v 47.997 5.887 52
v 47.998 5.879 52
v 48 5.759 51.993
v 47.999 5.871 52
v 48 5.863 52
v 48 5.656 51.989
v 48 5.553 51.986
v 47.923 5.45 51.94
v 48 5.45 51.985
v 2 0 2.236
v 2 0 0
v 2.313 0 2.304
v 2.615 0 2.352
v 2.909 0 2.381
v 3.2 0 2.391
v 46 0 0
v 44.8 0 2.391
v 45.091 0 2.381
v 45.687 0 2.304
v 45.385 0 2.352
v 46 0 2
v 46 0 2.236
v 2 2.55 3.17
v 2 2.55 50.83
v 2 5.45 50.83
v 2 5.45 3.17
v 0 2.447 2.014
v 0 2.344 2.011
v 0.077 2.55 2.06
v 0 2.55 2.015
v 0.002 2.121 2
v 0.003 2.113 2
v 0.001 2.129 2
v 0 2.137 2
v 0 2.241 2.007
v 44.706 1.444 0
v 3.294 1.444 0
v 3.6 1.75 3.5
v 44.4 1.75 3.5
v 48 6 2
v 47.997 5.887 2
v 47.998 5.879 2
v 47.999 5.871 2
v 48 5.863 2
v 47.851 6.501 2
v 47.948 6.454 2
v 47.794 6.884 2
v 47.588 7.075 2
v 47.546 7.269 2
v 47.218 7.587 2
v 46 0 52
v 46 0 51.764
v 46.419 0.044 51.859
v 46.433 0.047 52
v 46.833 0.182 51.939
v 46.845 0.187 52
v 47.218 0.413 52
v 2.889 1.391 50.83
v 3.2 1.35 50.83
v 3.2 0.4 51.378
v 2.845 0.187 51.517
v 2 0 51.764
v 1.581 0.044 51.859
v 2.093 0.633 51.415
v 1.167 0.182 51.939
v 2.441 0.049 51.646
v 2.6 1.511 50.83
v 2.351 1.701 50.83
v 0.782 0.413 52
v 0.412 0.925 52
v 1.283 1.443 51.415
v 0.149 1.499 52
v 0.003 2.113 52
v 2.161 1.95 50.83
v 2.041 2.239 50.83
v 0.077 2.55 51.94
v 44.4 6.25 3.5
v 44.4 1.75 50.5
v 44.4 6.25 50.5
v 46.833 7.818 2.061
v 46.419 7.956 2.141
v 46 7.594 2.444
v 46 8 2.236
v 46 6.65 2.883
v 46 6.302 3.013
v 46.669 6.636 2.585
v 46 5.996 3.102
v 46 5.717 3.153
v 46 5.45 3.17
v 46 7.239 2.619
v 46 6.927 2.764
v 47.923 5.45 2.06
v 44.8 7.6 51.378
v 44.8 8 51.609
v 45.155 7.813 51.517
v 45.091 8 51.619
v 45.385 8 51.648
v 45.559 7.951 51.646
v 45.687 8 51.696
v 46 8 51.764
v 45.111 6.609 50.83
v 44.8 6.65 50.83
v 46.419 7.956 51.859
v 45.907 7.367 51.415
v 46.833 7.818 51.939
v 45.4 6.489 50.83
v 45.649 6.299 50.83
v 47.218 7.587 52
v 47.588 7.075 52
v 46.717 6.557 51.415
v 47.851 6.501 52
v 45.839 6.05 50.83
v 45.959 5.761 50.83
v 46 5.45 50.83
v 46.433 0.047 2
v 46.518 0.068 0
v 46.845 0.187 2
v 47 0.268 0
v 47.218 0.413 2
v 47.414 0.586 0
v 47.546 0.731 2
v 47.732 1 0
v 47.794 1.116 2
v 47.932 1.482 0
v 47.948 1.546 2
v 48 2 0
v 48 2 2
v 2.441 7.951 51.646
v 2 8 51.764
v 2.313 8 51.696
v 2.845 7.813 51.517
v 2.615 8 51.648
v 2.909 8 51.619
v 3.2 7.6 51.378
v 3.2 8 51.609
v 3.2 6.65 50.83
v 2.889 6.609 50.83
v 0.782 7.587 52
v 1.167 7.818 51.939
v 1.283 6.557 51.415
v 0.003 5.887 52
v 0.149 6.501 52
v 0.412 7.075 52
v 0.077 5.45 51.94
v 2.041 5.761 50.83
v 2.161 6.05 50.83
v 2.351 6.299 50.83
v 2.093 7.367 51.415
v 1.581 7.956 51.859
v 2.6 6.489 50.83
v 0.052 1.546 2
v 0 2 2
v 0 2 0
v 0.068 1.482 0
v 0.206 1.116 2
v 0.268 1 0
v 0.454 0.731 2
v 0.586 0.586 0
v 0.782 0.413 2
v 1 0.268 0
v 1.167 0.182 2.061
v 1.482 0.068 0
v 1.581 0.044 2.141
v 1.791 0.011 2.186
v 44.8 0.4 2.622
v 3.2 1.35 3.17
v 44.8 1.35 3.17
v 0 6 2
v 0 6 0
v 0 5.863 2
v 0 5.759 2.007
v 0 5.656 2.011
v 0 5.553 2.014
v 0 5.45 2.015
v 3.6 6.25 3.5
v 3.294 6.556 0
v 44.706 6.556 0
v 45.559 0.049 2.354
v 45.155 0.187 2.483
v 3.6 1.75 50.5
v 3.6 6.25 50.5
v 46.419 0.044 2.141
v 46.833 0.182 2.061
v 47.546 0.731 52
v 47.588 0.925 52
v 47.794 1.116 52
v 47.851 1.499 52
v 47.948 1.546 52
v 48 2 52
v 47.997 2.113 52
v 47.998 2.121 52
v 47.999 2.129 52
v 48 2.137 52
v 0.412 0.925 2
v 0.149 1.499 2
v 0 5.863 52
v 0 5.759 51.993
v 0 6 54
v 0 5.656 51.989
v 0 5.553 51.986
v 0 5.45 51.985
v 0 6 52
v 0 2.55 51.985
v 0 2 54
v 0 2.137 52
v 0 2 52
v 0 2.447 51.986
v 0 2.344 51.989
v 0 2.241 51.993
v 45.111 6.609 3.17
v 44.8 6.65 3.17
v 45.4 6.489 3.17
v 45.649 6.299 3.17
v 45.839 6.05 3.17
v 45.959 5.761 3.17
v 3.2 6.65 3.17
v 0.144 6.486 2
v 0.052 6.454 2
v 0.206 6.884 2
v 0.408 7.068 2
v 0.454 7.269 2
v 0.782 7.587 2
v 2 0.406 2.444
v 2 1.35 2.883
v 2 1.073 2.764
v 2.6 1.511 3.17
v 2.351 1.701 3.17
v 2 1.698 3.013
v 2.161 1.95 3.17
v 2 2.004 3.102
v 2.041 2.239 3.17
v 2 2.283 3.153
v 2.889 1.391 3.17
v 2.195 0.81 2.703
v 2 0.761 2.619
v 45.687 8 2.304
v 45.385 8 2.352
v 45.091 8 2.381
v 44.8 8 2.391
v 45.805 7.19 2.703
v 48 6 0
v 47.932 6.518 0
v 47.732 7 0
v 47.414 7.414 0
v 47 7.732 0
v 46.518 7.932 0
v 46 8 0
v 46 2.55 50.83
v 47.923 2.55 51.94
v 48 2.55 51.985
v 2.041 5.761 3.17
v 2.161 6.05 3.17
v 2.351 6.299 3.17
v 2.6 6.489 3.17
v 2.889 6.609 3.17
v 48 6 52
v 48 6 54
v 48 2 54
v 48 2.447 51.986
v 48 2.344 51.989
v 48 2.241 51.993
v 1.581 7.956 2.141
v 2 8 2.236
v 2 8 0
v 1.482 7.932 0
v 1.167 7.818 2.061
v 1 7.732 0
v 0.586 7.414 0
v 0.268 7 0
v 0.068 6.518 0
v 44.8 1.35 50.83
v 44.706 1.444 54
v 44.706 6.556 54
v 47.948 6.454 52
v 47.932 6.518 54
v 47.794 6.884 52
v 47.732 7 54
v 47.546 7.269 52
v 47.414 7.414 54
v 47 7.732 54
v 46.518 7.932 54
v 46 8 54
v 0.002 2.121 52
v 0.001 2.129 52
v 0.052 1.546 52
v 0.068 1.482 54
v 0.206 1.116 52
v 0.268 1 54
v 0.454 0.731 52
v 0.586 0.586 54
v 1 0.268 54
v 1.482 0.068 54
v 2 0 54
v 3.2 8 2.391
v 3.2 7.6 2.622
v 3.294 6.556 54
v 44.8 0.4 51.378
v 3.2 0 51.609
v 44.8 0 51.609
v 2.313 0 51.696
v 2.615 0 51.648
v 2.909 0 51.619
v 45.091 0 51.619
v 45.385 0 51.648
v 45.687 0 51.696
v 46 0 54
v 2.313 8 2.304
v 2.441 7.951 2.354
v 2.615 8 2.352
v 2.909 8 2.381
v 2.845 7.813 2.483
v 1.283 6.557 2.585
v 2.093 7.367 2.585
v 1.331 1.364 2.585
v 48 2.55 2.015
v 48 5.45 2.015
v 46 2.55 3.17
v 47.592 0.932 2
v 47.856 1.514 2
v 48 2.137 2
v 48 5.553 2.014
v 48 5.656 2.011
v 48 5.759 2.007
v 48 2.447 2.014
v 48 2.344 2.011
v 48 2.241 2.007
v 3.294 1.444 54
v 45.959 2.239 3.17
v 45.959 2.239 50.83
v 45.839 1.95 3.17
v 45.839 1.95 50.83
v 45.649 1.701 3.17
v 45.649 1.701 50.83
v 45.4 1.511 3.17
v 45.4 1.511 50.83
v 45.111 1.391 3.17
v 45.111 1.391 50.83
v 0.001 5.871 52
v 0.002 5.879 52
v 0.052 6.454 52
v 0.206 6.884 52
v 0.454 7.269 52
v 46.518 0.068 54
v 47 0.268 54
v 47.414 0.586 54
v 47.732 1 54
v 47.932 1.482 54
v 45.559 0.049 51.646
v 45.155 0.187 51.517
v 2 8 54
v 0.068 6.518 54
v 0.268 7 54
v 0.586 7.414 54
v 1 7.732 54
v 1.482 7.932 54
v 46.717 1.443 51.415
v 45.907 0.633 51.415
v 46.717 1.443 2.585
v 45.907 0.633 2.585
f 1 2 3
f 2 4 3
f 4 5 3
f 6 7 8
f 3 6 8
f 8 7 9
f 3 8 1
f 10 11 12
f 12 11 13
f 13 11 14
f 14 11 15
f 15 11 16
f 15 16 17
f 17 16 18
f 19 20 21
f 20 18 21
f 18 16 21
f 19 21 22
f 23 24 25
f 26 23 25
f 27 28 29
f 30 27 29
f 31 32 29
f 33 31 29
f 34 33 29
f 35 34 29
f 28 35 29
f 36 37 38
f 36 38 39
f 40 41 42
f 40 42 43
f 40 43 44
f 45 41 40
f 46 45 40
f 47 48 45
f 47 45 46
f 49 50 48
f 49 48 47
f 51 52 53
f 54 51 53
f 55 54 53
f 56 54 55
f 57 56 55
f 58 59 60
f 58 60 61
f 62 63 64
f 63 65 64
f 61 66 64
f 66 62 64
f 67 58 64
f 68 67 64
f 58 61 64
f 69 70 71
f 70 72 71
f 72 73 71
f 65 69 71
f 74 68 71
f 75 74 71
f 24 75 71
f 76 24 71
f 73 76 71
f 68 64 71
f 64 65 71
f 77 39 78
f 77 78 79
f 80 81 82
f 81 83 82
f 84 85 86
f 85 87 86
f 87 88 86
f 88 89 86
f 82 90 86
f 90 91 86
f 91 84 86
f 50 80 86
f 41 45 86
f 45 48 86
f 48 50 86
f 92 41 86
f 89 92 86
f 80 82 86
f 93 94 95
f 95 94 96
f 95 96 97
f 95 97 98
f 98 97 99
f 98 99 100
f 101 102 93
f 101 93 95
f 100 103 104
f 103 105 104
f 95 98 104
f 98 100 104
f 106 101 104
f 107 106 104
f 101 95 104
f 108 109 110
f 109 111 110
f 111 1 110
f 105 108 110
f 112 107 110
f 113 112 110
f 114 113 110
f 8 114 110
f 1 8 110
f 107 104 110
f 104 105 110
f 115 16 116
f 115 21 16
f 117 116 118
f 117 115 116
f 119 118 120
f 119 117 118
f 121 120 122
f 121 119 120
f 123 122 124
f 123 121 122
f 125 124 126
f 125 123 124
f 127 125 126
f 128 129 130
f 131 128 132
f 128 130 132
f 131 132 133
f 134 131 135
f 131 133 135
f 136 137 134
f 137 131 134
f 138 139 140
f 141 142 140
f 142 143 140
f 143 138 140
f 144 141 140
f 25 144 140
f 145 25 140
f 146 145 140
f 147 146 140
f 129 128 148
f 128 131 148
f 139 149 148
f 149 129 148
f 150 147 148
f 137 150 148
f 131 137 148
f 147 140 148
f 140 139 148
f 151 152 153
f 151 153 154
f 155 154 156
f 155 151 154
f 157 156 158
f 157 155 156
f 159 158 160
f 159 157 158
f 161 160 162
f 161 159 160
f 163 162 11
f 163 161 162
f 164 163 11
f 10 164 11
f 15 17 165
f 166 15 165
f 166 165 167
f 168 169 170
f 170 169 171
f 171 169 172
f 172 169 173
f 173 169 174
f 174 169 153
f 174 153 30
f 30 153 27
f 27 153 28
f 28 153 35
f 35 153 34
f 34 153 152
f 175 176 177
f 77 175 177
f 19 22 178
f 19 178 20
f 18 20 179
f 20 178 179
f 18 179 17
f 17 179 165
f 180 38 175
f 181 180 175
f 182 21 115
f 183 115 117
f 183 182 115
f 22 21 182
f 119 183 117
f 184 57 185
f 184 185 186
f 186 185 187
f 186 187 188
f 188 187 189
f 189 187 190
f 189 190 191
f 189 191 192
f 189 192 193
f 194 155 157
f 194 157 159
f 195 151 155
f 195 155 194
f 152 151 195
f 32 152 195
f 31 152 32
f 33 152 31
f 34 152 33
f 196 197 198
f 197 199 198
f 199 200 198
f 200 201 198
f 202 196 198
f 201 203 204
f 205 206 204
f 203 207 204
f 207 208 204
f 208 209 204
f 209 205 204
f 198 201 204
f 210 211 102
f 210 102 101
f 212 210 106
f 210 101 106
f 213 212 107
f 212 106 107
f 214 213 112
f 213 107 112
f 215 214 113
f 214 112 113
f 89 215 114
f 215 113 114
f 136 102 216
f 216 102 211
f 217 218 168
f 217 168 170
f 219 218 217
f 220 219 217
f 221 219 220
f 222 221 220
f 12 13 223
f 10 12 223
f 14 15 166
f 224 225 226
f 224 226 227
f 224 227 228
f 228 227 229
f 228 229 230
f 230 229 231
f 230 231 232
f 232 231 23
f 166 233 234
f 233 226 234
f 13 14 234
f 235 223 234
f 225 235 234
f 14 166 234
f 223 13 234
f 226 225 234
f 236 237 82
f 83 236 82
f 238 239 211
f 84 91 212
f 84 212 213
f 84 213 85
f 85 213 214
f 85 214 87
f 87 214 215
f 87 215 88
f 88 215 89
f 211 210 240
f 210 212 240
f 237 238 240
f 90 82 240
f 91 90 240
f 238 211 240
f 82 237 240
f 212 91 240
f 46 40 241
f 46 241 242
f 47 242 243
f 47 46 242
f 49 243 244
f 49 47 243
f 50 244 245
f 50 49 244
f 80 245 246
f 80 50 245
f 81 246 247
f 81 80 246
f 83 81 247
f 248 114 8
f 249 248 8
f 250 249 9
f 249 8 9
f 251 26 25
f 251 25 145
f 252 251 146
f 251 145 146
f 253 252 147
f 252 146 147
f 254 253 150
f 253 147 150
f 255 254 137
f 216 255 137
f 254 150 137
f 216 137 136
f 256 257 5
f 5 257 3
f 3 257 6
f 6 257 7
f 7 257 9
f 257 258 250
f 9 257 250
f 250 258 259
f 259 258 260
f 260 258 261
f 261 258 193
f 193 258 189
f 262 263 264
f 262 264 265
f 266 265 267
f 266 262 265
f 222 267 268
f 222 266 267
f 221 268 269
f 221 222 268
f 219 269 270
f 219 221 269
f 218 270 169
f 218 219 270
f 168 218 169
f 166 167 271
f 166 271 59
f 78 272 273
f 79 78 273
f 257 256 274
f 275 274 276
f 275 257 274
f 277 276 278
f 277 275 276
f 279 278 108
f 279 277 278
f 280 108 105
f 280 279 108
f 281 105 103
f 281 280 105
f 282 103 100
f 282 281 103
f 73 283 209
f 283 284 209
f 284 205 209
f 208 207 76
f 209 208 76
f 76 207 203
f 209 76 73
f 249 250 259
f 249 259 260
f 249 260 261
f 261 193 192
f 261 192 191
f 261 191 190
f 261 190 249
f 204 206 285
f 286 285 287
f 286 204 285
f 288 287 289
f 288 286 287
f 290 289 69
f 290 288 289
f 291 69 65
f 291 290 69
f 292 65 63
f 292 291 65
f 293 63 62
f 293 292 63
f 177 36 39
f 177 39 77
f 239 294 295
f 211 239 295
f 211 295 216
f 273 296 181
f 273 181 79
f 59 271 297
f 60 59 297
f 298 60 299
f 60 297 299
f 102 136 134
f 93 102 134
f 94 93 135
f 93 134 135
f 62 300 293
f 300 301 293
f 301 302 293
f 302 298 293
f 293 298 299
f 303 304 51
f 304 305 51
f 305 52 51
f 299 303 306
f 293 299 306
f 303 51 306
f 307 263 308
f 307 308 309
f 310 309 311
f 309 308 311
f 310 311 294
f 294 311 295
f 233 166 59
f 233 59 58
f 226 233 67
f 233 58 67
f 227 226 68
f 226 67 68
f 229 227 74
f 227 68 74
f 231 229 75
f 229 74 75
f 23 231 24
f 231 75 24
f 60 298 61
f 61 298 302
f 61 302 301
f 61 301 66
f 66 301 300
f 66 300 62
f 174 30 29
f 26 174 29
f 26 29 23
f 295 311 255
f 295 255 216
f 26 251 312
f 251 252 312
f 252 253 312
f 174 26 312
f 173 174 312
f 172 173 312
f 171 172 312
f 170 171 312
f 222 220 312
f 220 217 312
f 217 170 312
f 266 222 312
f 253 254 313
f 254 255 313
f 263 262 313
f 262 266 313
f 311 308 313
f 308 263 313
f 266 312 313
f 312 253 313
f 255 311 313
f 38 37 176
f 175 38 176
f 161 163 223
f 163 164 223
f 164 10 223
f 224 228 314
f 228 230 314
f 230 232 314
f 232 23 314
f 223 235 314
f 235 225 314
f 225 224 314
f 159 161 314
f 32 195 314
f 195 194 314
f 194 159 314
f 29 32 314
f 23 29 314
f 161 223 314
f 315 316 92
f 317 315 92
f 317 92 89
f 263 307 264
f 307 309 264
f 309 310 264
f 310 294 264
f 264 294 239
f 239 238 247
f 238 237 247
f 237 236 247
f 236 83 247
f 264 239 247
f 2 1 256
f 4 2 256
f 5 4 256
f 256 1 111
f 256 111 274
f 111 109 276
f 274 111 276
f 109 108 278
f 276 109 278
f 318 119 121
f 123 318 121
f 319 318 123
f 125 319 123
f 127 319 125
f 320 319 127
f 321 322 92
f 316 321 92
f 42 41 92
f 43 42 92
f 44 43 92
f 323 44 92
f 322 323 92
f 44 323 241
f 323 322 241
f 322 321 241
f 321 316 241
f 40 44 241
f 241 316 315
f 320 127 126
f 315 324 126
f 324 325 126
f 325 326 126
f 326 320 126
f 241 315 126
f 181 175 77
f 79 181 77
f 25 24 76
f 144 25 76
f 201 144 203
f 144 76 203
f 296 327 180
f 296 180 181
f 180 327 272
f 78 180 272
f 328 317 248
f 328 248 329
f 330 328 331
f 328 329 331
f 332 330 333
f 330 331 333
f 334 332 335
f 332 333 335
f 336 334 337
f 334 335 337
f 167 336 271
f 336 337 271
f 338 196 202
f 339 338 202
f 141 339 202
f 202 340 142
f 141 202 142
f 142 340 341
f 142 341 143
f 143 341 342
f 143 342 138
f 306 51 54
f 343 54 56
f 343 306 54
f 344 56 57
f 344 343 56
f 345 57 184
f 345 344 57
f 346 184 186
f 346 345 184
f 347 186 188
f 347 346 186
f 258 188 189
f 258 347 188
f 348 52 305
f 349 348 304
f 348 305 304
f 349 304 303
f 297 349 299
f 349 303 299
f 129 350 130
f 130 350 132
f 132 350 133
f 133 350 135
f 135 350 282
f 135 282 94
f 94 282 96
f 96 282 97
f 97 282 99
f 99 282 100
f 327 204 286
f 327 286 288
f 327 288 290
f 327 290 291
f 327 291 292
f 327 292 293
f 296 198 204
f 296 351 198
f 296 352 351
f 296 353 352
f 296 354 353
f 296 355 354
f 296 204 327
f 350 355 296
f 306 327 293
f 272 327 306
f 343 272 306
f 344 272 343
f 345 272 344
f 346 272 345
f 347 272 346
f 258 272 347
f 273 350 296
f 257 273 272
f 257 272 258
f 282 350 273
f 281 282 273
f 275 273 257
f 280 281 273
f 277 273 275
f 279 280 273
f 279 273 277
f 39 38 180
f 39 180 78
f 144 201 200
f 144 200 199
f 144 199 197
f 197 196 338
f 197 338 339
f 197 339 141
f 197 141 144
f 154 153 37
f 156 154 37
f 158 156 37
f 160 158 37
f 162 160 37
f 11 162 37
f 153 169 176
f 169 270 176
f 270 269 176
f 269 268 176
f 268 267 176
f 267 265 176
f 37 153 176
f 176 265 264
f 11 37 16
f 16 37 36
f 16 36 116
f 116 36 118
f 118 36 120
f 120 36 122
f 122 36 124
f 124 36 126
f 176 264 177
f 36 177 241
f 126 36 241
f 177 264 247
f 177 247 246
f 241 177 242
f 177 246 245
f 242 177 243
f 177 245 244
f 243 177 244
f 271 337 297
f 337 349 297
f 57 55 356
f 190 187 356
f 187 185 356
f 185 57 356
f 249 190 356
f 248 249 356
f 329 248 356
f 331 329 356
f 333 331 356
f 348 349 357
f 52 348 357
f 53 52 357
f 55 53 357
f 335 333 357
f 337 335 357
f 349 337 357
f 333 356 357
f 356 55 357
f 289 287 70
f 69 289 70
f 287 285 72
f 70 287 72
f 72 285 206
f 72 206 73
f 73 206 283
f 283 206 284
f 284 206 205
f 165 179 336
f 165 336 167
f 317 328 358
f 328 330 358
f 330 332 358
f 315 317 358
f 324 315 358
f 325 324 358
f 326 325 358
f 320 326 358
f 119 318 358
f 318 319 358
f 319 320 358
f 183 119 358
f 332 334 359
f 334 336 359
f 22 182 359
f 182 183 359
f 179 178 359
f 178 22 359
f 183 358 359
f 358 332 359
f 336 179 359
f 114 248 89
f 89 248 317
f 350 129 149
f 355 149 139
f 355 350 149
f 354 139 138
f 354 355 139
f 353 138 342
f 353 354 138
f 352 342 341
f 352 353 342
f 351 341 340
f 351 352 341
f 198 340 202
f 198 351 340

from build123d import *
from OCP.BRepFilletAPI import BRepFilletAPI_MakeChamfer

# Parameters (mm, degrees)
SKETCH1_W           = 48
SKETCH1_H           = 8
SKETCH1_W_2         = 40.8
SKETCH1_H_2         = 4.5
BOSS_EXTRUDE1_DEPTH = 54
CUT_EXTRUDE1_START  = -2
SKETCH2_OUTSIDE_W   = 64.538
SKETCH2_OUTSIDE_H   = 24.538
CUT_EXTRUDE1_DEPTH  = 50
FILLET1_R           = 2
CHAMFER4_SIZE       = 1.17
CHAMFER4_SIZE_2     = 2.026499445
CHAMFER5_SIZE       = 3.5
CHAMFER5_SIZE2      = 0.306210322


with BuildPart() as part:
    # Sketch1 → Boss-Extrude1 (new body)
    with BuildSketch(Plane.XY):
        with Locations((24, 4)):
            Rectangle(SKETCH1_W, SKETCH1_H)
        with Locations((24, 4)):
            Rectangle(SKETCH1_W_2, SKETCH1_H_2, mode=Mode.SUBTRACT)
    extrude(amount=BOSS_EXTRUDE1_DEPTH)

    # Sketch2 outside → Cut-Extrude1 (cut)
    with BuildSketch(Plane.XY.offset(54).offset(CUT_EXTRUDE1_START)):
        with Locations((24, 4)):
            Rectangle(SKETCH2_OUTSIDE_W, SKETCH2_OUTSIDE_H)
        with BuildLine():
            Line((3.2, 6.65), (44.8, 6.65))
            ThreePointArc((44.8, 6.65), (45.648528137, 6.298528137), (46, 5.45))
            Line((46, 5.45), (46, 2.55))
            ThreePointArc((46, 2.55), (45.648528137, 1.701471863), (44.8, 1.35))
            Line((44.8, 1.35), (3.2, 1.35))
            ThreePointArc((3.2, 1.35), (2.351471863, 1.701471863), (2, 2.55))
            Line((2, 2.55), (2, 5.45))
            ThreePointArc((2, 5.45), (2.351471863, 6.298528137), (3.2, 6.65))
        make_face(mode=Mode.SUBTRACT)
    extrude(amount=-CUT_EXTRUDE1_DEPTH, mode=Mode.SUBTRACT)

    # Fillet1
    fillet1_edges = [part.edges().sort_by_distance(p)[0] for p in [
        (48, 0, 1),
        (0, 0, 1),
        (0, 8, 1),
        (48, 8, 1),
        (48, 0, 53),
        (0, 0, 53),
        (0, 8, 53),
        (48, 8, 53),
    ]]
    fillet(fillet1_edges, radius=FILLET1_R)

    # Chamfer4
    # the kernel refuses this chamfer: 2.026499445, 1.17 mm, written as the material it adds along each edge
    with BuildSketch(Plane(origin=(2, 2.55, 52), x_dir=(0.05789386240267108, 0, -0.9983227437537927), z_dir=(0, 1, 0))) as chamfer4_piece_1_section:
        Polygon((CHAMFER4_SIZE * 0.998322743754, CHAMFER4_SIZE * 0.0578938624027), (-CHAMFER4_SIZE_2 * 0.0578938623985, CHAMFER4_SIZE_2 * 0.998322743683), (0, 0), align=None)
    chamfer4_piece_1 = extrude(amount=2.9, mode=Mode.PRIVATE)
    chamfer4_piece_1 = split(chamfer4_piece_1, bisect_by=Plane(origin=(0, 4, 51.609934173), z_dir=(1, 0, 0)), keep=Keep.TOP, mode=Mode.PRIVATE)
    add(chamfer4_piece_1)
    with BuildSketch(Plane(origin=(2, 2.55, 2), x_dir=(-0.999813220622208, 0, -0.019326765612700622), z_dir=(0, 1, 0))) as chamfer4_piece_2_section:
        Polygon((CHAMFER4_SIZE_2 * 0.999813220551, CHAMFER4_SIZE_2 * 0.0193267656113), (-CHAMFER4_SIZE * 0.0193267656127, CHAMFER4_SIZE * 0.999813220622), (0, 0), align=None)
    chamfer4_piece_2 = extrude(amount=2.9, mode=Mode.PRIVATE)
    chamfer4_piece_2 = split(chamfer4_piece_2, bisect_by=Plane(origin=(0, 4, 2.390065827), z_dir=(1, 0, 0)), keep=Keep.TOP, mode=Mode.PRIVATE)
    add(chamfer4_piece_2)
    with BuildSketch(Plane(origin=(3.2, 2.55, 52), x_dir=(0, -1, 0), z_dir=(1, 0, 0))) as chamfer4_piece_3_section:
        Polygon((1.2, CHAMFER4_SIZE), (1.2 + CHAMFER4_SIZE_2, 0), (1.2, 0), align=None)
    chamfer4_piece_3 = revolve(axis=Axis((3.2, 2.55, 52), (0, 0, -1)), revolution_arc=90, mode=Mode.PRIVATE)
    chamfer4_piece_3 = chamfer4_piece_3 & Plane(origin=(2, 2, 51.456530792), x_dir=(0, -1, 0), z_dir=(0, 0, 1)) * Cylinder(2, 13, mode=Mode.PRIVATE)
    add(chamfer4_piece_3)
    with BuildSketch(Plane(origin=(3.2, 2.55, 52), x_dir=(0, -1, 0), z_dir=(1, 0, 0))) as chamfer4_piece_4_section:
        Polygon((1.2, CHAMFER4_SIZE), (1.2 + CHAMFER4_SIZE_2, 0), (1.2, 0), align=None)
    chamfer4_piece_4 = revolve(axis=Axis((3.2, 2.55, 52), (0, 0, -1)), revolution_arc=90, mode=Mode.PRIVATE)
    chamfer4_piece_4 = split(chamfer4_piece_4, bisect_by=Plane(origin=(2, 0.130683468, 51.773765117), z_dir=(1, 0, 0)), keep=Keep.TOP, mode=Mode.PRIVATE)
    chamfer4_piece_4 = split(chamfer4_piece_4, bisect_by=Plane(origin=(2.932508476, 0, 51.773765117), z_dir=(0, 1, 0)), keep=Keep.TOP, mode=Mode.PRIVATE)
    add(chamfer4_piece_4)
    with BuildSketch(Plane(origin=(3.2, 2.55, 52), x_dir=(0, -1, 0), z_dir=(1, 0, 0))) as chamfer4_piece_5_section:
        Polygon((1.2, CHAMFER4_SIZE), (1.2 + CHAMFER4_SIZE_2, 0), (1.2, 0), align=None)
    chamfer4_piece_5 = revolve(axis=Axis((3.2, 2.55, 52), (0, 0, -1)), revolution_arc=90, mode=Mode.PRIVATE)
    chamfer4_piece_5 = split(chamfer4_piece_5, bisect_by=Plane(origin=(0.031272967, 1.35, 51.984062188), z_dir=(0, 1, 0)), keep=Keep.TOP, mode=Mode.PRIVATE)
    chamfer4_piece_5 = split(chamfer4_piece_5, bisect_by=Plane(origin=(0, 2.450571478, 51.984062188), z_dir=(1, 0, 0)), keep=Keep.TOP, mode=Mode.PRIVATE)
    add(chamfer4_piece_5)
    with BuildSketch(Plane(origin=(3.2, 2.55, 2), x_dir=(0, -1, 0), z_dir=(1, 0, 0))) as chamfer4_piece_6_section:
        Polygon((1.2 + CHAMFER4_SIZE_2, 0), (1.2, -CHAMFER4_SIZE), (1.2, 0), align=None)
    chamfer4_piece_6 = revolve(axis=Axis((3.2, 2.55, 2), (0, 0, -1)), revolution_arc=90, mode=Mode.PRIVATE)
    chamfer4_piece_6 = split(chamfer4_piece_6, bisect_by=Plane(origin=(2.932508484, 0, 2.226234886), z_dir=(0, 1, 0)), keep=Keep.TOP, mode=Mode.PRIVATE)
    chamfer4_piece_6 = split(chamfer4_piece_6, bisect_by=Plane(origin=(2, 0.130683471, 2.226234886), z_dir=(1, 0, 0)), keep=Keep.TOP, mode=Mode.PRIVATE)
    add(chamfer4_piece_6)
    with BuildSketch(Plane(origin=(3.2, 2.55, 2), x_dir=(0, -1, 0), z_dir=(1, 0, 0))) as chamfer4_piece_7_section:
        Polygon((1.2 + CHAMFER4_SIZE_2, 0), (1.2, -CHAMFER4_SIZE), (1.2, 0), align=None)
    chamfer4_piece_7 = revolve(axis=Axis((3.2, 2.55, 2), (0, 0, -1)), revolution_arc=90, mode=Mode.PRIVATE)
    chamfer4_piece_7 = chamfer4_piece_7 & Plane(origin=(2, 2, 2.22929574), x_dir=(-1, 0, 0), z_dir=(0, 0, 1)) * Cylinder(2, 13, mode=Mode.PRIVATE)
    add(chamfer4_piece_7)
    with BuildSketch(Plane(origin=(3.2, 2.55, 2), x_dir=(0, -1, 0), z_dir=(1, 0, 0))) as chamfer4_piece_8_section:
        Polygon((1.2 + CHAMFER4_SIZE_2, 0), (1.2, -CHAMFER4_SIZE), (1.2, 0), align=None)
    chamfer4_piece_8 = revolve(axis=Axis((3.2, 2.55, 2), (0, 0, -1)), revolution_arc=90, mode=Mode.PRIVATE)
    chamfer4_piece_8 = split(chamfer4_piece_8, bisect_by=Plane(origin=(0, 2.450571478, 2.015937812), z_dir=(1, 0, 0)), keep=Keep.TOP, mode=Mode.PRIVATE)
    chamfer4_piece_8 = split(chamfer4_piece_8, bisect_by=Plane(origin=(0.031272967, 1.35, 2.015937812), z_dir=(0, 1, 0)), keep=Keep.TOP, mode=Mode.PRIVATE)
    add(chamfer4_piece_8)
    with BuildSketch(Plane(origin=(3.2, 5.45, 52), x_dir=(-1, 0, 0), z_dir=(0, -1, 0))) as chamfer4_piece_9_section:
        Polygon((1.2, CHAMFER4_SIZE), (1.2 + CHAMFER4_SIZE_2, 0), (1.2, 0), align=None)
    chamfer4_piece_9 = revolve(axis=Axis((3.2, 5.45, 52), (0, 0, -1)), revolution_arc=90, mode=Mode.PRIVATE)
    chamfer4_piece_9 = chamfer4_piece_9 & Plane(origin=(2, 6, 51.456530792), x_dir=(0, 1, 0), z_dir=(0, 0, 1)) * Cylinder(2, 13, mode=Mode.PRIVATE)
    add(chamfer4_piece_9)
    with BuildSketch(Plane(origin=(3.2, 5.45, 52), x_dir=(-1, 0, 0), z_dir=(0, -1, 0))) as chamfer4_piece_10_section:
        Polygon((1.2, CHAMFER4_SIZE), (1.2 + CHAMFER4_SIZE_2, 0), (1.2, 0), align=None)
    chamfer4_piece_10 = revolve(axis=Axis((3.2, 5.45, 52), (0, 0, -1)), revolution_arc=90, mode=Mode.PRIVATE)
    chamfer4_piece_10 = split(chamfer4_piece_10, bisect_by=Plane(origin=(0.031272967, 6.65, 51.984062188), z_dir=(0, -1, 0)), keep=Keep.TOP, mode=Mode.PRIVATE)
    chamfer4_piece_10 = split(chamfer4_piece_10, bisect_by=Plane(origin=(0, 5.549428522, 51.984062188), z_dir=(1, 0, 0)), keep=Keep.TOP, mode=Mode.PRIVATE)
    add(chamfer4_piece_10)
    with BuildSketch(Plane(origin=(3.2, 5.45, 52), x_dir=(-1, 0, 0), z_dir=(0, -1, 0))) as chamfer4_piece_11_section:
        Polygon((1.2, CHAMFER4_SIZE), (1.2 + CHAMFER4_SIZE_2, 0), (1.2, 0), align=None)
    chamfer4_piece_11 = revolve(axis=Axis((3.2, 5.45, 52), (0, 0, -1)), revolution_arc=90, mode=Mode.PRIVATE)
    chamfer4_piece_11 = split(chamfer4_piece_11, bisect_by=Plane(origin=(2, 7.869316535, 51.773765118), z_dir=(1, 0, 0)), keep=Keep.TOP, mode=Mode.PRIVATE)
    chamfer4_piece_11 = split(chamfer4_piece_11, bisect_by=Plane(origin=(2.932508473, 8, 51.773765118), z_dir=(0, -1, 0)), keep=Keep.TOP, mode=Mode.PRIVATE)
    add(chamfer4_piece_11)
    with BuildSketch(Plane(origin=(3.2, 5.45, 2), x_dir=(-1, 0, 0), z_dir=(0, -1, 0))) as chamfer4_piece_12_section:
        Polygon((1.2 + CHAMFER4_SIZE_2, 0), (1.2, -CHAMFER4_SIZE), (1.2, 0), align=None)
    chamfer4_piece_12 = revolve(axis=Axis((3.2, 5.45, 2), (0, 0, -1)), revolution_arc=90, mode=Mode.PRIVATE)
    chamfer4_piece_12 = split(chamfer4_piece_12, bisect_by=Plane(origin=(0, 5.549428522, 2.015937812), z_dir=(1, 0, 0)), keep=Keep.TOP, mode=Mode.PRIVATE)
    chamfer4_piece_12 = split(chamfer4_piece_12, bisect_by=Plane(origin=(0.031272967, 6.65, 2.015937812), z_dir=(0, -1, 0)), keep=Keep.TOP, mode=Mode.PRIVATE)
    add(chamfer4_piece_12)
    with BuildSketch(Plane(origin=(3.2, 5.45, 2), x_dir=(-1, 0, 0), z_dir=(0, -1, 0))) as chamfer4_piece_13_section:
        Polygon((1.2 + CHAMFER4_SIZE_2, 0), (1.2, -CHAMFER4_SIZE), (1.2, 0), align=None)
    chamfer4_piece_13 = revolve(axis=Axis((3.2, 5.45, 2), (0, 0, -1)), revolution_arc=90, mode=Mode.PRIVATE)
    chamfer4_piece_13 = chamfer4_piece_13 & Plane(origin=(2, 6, 2.22929574), x_dir=(0, 1, 0), z_dir=(0, 0, 1)) * Cylinder(2, 13, mode=Mode.PRIVATE)
    add(chamfer4_piece_13)
    with BuildSketch(Plane(origin=(3.2, 5.45, 2), x_dir=(-1, 0, 0), z_dir=(0, -1, 0))) as chamfer4_piece_14_section:
        Polygon((1.2 + CHAMFER4_SIZE_2, 0), (1.2, -CHAMFER4_SIZE), (1.2, 0), align=None)
    chamfer4_piece_14 = revolve(axis=Axis((3.2, 5.45, 2), (0, 0, -1)), revolution_arc=90, mode=Mode.PRIVATE)
    chamfer4_piece_14 = split(chamfer4_piece_14, bisect_by=Plane(origin=(2.932508473, 8, 2.226234882), z_dir=(0, -1, 0)), keep=Keep.TOP, mode=Mode.PRIVATE)
    chamfer4_piece_14 = split(chamfer4_piece_14, bisect_by=Plane(origin=(2, 7.869316535, 2.226234882), z_dir=(1, 0, 0)), keep=Keep.TOP, mode=Mode.PRIVATE)
    add(chamfer4_piece_14)
    with BuildSketch(Plane(origin=(44.8, 1.35, 52), x_dir=(0, 0.05789386240267127, -0.9983227437537927), z_dir=(-1, 0, 0))) as chamfer4_piece_15_section:
        Polygon((CHAMFER4_SIZE * 0.998322743754, CHAMFER4_SIZE * 0.0578938624027), (-CHAMFER4_SIZE_2 * 0.0578938623985, CHAMFER4_SIZE_2 * 0.998322743683), (0, 0), align=None)
    chamfer4_piece_15 = extrude(amount=41.6, mode=Mode.PRIVATE)
    chamfer4_piece_15 = split(chamfer4_piece_15, bisect_by=Plane(origin=(24, 0, 51.577415794), z_dir=(0, 1, 0)), keep=Keep.TOP, mode=Mode.PRIVATE)
    add(chamfer4_piece_15)
    with BuildSketch(Plane(origin=(44.8, 1.35, 2), x_dir=(0, -0.999813220622208, -0.019326765612700633), z_dir=(-1, 0, 0))) as chamfer4_piece_16_section:
        Polygon((CHAMFER4_SIZE_2 * 0.999813220551, CHAMFER4_SIZE_2 * 0.0193267656113), (-CHAMFER4_SIZE * 0.0193267656127, CHAMFER4_SIZE * 0.999813220622), (0, 0), align=None)
    chamfer4_piece_16 = extrude(amount=41.6, mode=Mode.PRIVATE)
    chamfer4_piece_16 = split(chamfer4_piece_16, bisect_by=Plane(origin=(24, 0, 2.422584206), z_dir=(0, 1, 0)), keep=Keep.TOP, mode=Mode.PRIVATE)
    add(chamfer4_piece_16)
    with BuildSketch(Plane(origin=(3.2, 6.65, 52), x_dir=(0, -0.05789386240267145, -0.9983227437537927), z_dir=(1, 0, 0))) as chamfer4_piece_17_section:
        Polygon((CHAMFER4_SIZE * 0.998322743754, CHAMFER4_SIZE * 0.0578938624027), (-CHAMFER4_SIZE_2 * 0.0578938623985, CHAMFER4_SIZE_2 * 0.998322743683), (0, 0), align=None)
    chamfer4_piece_17 = extrude(amount=41.6, mode=Mode.PRIVATE)
    chamfer4_piece_17 = split(chamfer4_piece_17, bisect_by=Plane(origin=(24, 8, 51.577415794), z_dir=(0, -1, 0)), keep=Keep.TOP, mode=Mode.PRIVATE)
    add(chamfer4_piece_17)
    with BuildSketch(Plane(origin=(3.2, 6.65, 2), x_dir=(0, 0.999813220622208, -0.019326765612700633), z_dir=(1, 0, 0))) as chamfer4_piece_18_section:
        Polygon((CHAMFER4_SIZE_2 * 0.999813220551, CHAMFER4_SIZE_2 * 0.0193267656113), (-CHAMFER4_SIZE * 0.0193267656127, CHAMFER4_SIZE * 0.999813220622), (0, 0), align=None)
    chamfer4_piece_18 = extrude(amount=41.6, mode=Mode.PRIVATE)
    chamfer4_piece_18 = split(chamfer4_piece_18, bisect_by=Plane(origin=(24, 8, 2.422584206), z_dir=(0, -1, 0)), keep=Keep.TOP, mode=Mode.PRIVATE)
    add(chamfer4_piece_18)
    with BuildSketch(Plane(origin=(44.8, 2.55, 52), x_dir=(1, 0, 0), z_dir=(0, 1, 0))) as chamfer4_piece_19_section:
        Polygon((1.2, CHAMFER4_SIZE), (1.2 + CHAMFER4_SIZE_2, 0), (1.2, 0), align=None)
    chamfer4_piece_19 = revolve(axis=Axis((44.8, 2.55, 52), (0, 0, -1)), revolution_arc=90, mode=Mode.PRIVATE)
    chamfer4_piece_19 = chamfer4_piece_19 & Plane(origin=(46, 2, 51.456530792), x_dir=(1, 0, 0), z_dir=(0, 0, 1)) * Cylinder(2, 13, mode=Mode.PRIVATE)
    add(chamfer4_piece_19)
    with BuildSketch(Plane(origin=(44.8, 2.55, 52), x_dir=(1, 0, 0), z_dir=(0, 1, 0))) as chamfer4_piece_20_section:
        Polygon((1.2, CHAMFER4_SIZE), (1.2 + CHAMFER4_SIZE_2, 0), (1.2, 0), align=None)
    chamfer4_piece_20 = revolve(axis=Axis((44.8, 2.55, 52), (0, 0, -1)), revolution_arc=90, mode=Mode.PRIVATE)
    chamfer4_piece_20 = split(chamfer4_piece_20, bisect_by=Plane(origin=(47.968727033, 1.35, 51.984062188), z_dir=(0, 1, 0)), keep=Keep.TOP, mode=Mode.PRIVATE)
    chamfer4_piece_20 = split(chamfer4_piece_20, bisect_by=Plane(origin=(48, 2.450571478, 51.984062188), z_dir=(-1, 0, 0)), keep=Keep.TOP, mode=Mode.PRIVATE)
    add(chamfer4_piece_20)
    with BuildSketch(Plane(origin=(44.8, 2.55, 52), x_dir=(1, 0, 0), z_dir=(0, 1, 0))) as chamfer4_piece_21_section:
        Polygon((1.2, CHAMFER4_SIZE), (1.2 + CHAMFER4_SIZE_2, 0), (1.2, 0), align=None)
    chamfer4_piece_21 = revolve(axis=Axis((44.8, 2.55, 52), (0, 0, -1)), revolution_arc=90, mode=Mode.PRIVATE)
    chamfer4_piece_21 = split(chamfer4_piece_21, bisect_by=Plane(origin=(46, 0.130683468, 51.773765114), z_dir=(-1, 0, 0)), keep=Keep.TOP, mode=Mode.PRIVATE)
    chamfer4_piece_21 = split(chamfer4_piece_21, bisect_by=Plane(origin=(45.067491519, 0, 51.773765114), z_dir=(0, 1, 0)), keep=Keep.TOP, mode=Mode.PRIVATE)
    add(chamfer4_piece_21)
    with BuildSketch(Plane(origin=(44.8, 2.55, 2), x_dir=(1, 0, 0), z_dir=(0, 1, 0))) as chamfer4_piece_22_section:
        Polygon((1.2 + CHAMFER4_SIZE_2, 0), (1.2, -CHAMFER4_SIZE), (1.2, 0), align=None)
    chamfer4_piece_22 = revolve(axis=Axis((44.8, 2.55, 2), (0, 0, -1)), revolution_arc=90, mode=Mode.PRIVATE)
    chamfer4_piece_22 = split(chamfer4_piece_22, bisect_by=Plane(origin=(48, 2.450571478, 2.015937812), z_dir=(-1, 0, 0)), keep=Keep.TOP, mode=Mode.PRIVATE)
    chamfer4_piece_22 = split(chamfer4_piece_22, bisect_by=Plane(origin=(47.968727033, 1.35, 2.015937812), z_dir=(0, 1, 0)), keep=Keep.TOP, mode=Mode.PRIVATE)
    add(chamfer4_piece_22)
    with BuildSketch(Plane(origin=(44.8, 2.55, 2), x_dir=(1, 0, 0), z_dir=(0, 1, 0))) as chamfer4_piece_23_section:
        Polygon((1.2 + CHAMFER4_SIZE_2, 0), (1.2, -CHAMFER4_SIZE), (1.2, 0), align=None)
    chamfer4_piece_23 = revolve(axis=Axis((44.8, 2.55, 2), (0, 0, -1)), revolution_arc=90, mode=Mode.PRIVATE)
    chamfer4_piece_23 = chamfer4_piece_23 & Plane(origin=(46, 2, 2.22929574), x_dir=(1, 0, 0), z_dir=(0, 0, 1)) * Cylinder(2, 13, mode=Mode.PRIVATE)
    add(chamfer4_piece_23)
    with BuildSketch(Plane(origin=(44.8, 2.55, 2), x_dir=(1, 0, 0), z_dir=(0, 1, 0))) as chamfer4_piece_24_section:
        Polygon((1.2 + CHAMFER4_SIZE_2, 0), (1.2, -CHAMFER4_SIZE), (1.2, 0), align=None)
    chamfer4_piece_24 = revolve(axis=Axis((44.8, 2.55, 2), (0, 0, -1)), revolution_arc=90, mode=Mode.PRIVATE)
    chamfer4_piece_24 = split(chamfer4_piece_24, bisect_by=Plane(origin=(45.067491519, 0, 2.226234886), z_dir=(0, 1, 0)), keep=Keep.TOP, mode=Mode.PRIVATE)
    chamfer4_piece_24 = split(chamfer4_piece_24, bisect_by=Plane(origin=(46, 0.130683468, 2.226234886), z_dir=(-1, 0, 0)), keep=Keep.TOP, mode=Mode.PRIVATE)
    add(chamfer4_piece_24)
    with BuildSketch(Plane(origin=(44.8, 5.45, 52), x_dir=(0, 1, 0), z_dir=(-1, 0, 0))) as chamfer4_piece_25_section:
        Polygon((1.2, CHAMFER4_SIZE), (1.2 + CHAMFER4_SIZE_2, 0), (1.2, 0), align=None)
    chamfer4_piece_25 = revolve(axis=Axis((44.8, 5.45, 52), (0, 0, -1)), revolution_arc=90, mode=Mode.PRIVATE)
    chamfer4_piece_25 = chamfer4_piece_25 & Plane(origin=(46, 6, 51.456530792), x_dir=(0, 1, 0), z_dir=(0, 0, 1)) * Cylinder(2, 13, mode=Mode.PRIVATE)
    add(chamfer4_piece_25)
    with BuildSketch(Plane(origin=(44.8, 5.45, 52), x_dir=(0, 1, 0), z_dir=(-1, 0, 0))) as chamfer4_piece_26_section:
        Polygon((1.2, CHAMFER4_SIZE), (1.2 + CHAMFER4_SIZE_2, 0), (1.2, 0), align=None)
    chamfer4_piece_26 = revolve(axis=Axis((44.8, 5.45, 52), (0, 0, -1)), revolution_arc=90, mode=Mode.PRIVATE)
    chamfer4_piece_26 = split(chamfer4_piece_26, bisect_by=Plane(origin=(46, 7.869316532, 51.773765117), z_dir=(-1, 0, 0)), keep=Keep.TOP, mode=Mode.PRIVATE)
    chamfer4_piece_26 = split(chamfer4_piece_26, bisect_by=Plane(origin=(45.067491524, 8, 51.773765117), z_dir=(0, -1, 0)), keep=Keep.TOP, mode=Mode.PRIVATE)
    add(chamfer4_piece_26)
    with BuildSketch(Plane(origin=(44.8, 5.45, 52), x_dir=(0, 1, 0), z_dir=(-1, 0, 0))) as chamfer4_piece_27_section:
        Polygon((1.2, CHAMFER4_SIZE), (1.2 + CHAMFER4_SIZE_2, 0), (1.2, 0), align=None)
    chamfer4_piece_27 = revolve(axis=Axis((44.8, 5.45, 52), (0, 0, -1)), revolution_arc=90, mode=Mode.PRIVATE)
    chamfer4_piece_27 = split(chamfer4_piece_27, bisect_by=Plane(origin=(47.968727033, 6.65, 51.984062188), z_dir=(0, -1, 0)), keep=Keep.TOP, mode=Mode.PRIVATE)
    chamfer4_piece_27 = split(chamfer4_piece_27, bisect_by=Plane(origin=(48, 5.549428522, 51.984062188), z_dir=(-1, 0, 0)), keep=Keep.TOP, mode=Mode.PRIVATE)
    add(chamfer4_piece_27)
    with BuildSketch(Plane(origin=(44.8, 5.45, 2), x_dir=(0, 1, 0), z_dir=(-1, 0, 0))) as chamfer4_piece_28_section:
        Polygon((1.2 + CHAMFER4_SIZE_2, 0), (1.2, -CHAMFER4_SIZE), (1.2, 0), align=None)
    chamfer4_piece_28 = revolve(axis=Axis((44.8, 5.45, 2), (0, 0, -1)), revolution_arc=90, mode=Mode.PRIVATE)
    chamfer4_piece_28 = split(chamfer4_piece_28, bisect_by=Plane(origin=(45.067491524, 8, 2.226234883), z_dir=(0, -1, 0)), keep=Keep.TOP, mode=Mode.PRIVATE)
    chamfer4_piece_28 = split(chamfer4_piece_28, bisect_by=Plane(origin=(46, 7.869316532, 2.226234883), z_dir=(-1, 0, 0)), keep=Keep.TOP, mode=Mode.PRIVATE)
    add(chamfer4_piece_28)
    with BuildSketch(Plane(origin=(44.8, 5.45, 2), x_dir=(0, 1, 0), z_dir=(-1, 0, 0))) as chamfer4_piece_29_section:
        Polygon((1.2 + CHAMFER4_SIZE_2, 0), (1.2, -CHAMFER4_SIZE), (1.2, 0), align=None)
    chamfer4_piece_29 = revolve(axis=Axis((44.8, 5.45, 2), (0, 0, -1)), revolution_arc=90, mode=Mode.PRIVATE)
    chamfer4_piece_29 = chamfer4_piece_29 & Plane(origin=(46, 6, 2.22929574), x_dir=(0, 1, 0), z_dir=(0, 0, 1)) * Cylinder(2, 13, mode=Mode.PRIVATE)
    add(chamfer4_piece_29)
    with BuildSketch(Plane(origin=(44.8, 5.45, 2), x_dir=(0, 1, 0), z_dir=(-1, 0, 0))) as chamfer4_piece_30_section:
        Polygon((1.2 + CHAMFER4_SIZE_2, 0), (1.2, -CHAMFER4_SIZE), (1.2, 0), align=None)
    chamfer4_piece_30 = revolve(axis=Axis((44.8, 5.45, 2), (0, 0, -1)), revolution_arc=90, mode=Mode.PRIVATE)
    chamfer4_piece_30 = split(chamfer4_piece_30, bisect_by=Plane(origin=(48, 5.549428522, 2.015937812), z_dir=(-1, 0, 0)), keep=Keep.TOP, mode=Mode.PRIVATE)
    chamfer4_piece_30 = split(chamfer4_piece_30, bisect_by=Plane(origin=(47.968727033, 6.65, 2.015937812), z_dir=(0, -1, 0)), keep=Keep.TOP, mode=Mode.PRIVATE)
    add(chamfer4_piece_30)
    with BuildSketch(Plane(origin=(46, 5.45, 52), x_dir=(-0.057893862402670714, 0, -0.9983227437537927), z_dir=(0, -1, 0))) as chamfer4_piece_31_section:
        Polygon((CHAMFER4_SIZE * 0.998322743754, CHAMFER4_SIZE * 0.0578938624027), (-CHAMFER4_SIZE_2 * 0.0578938623985, CHAMFER4_SIZE_2 * 0.998322743683), (0, 0), align=None)
    chamfer4_piece_31 = extrude(amount=2.9, mode=Mode.PRIVATE)
    chamfer4_piece_31 = split(chamfer4_piece_31, bisect_by=Plane(origin=(48, 4, 51.609934173), z_dir=(-1, 0, 0)), keep=Keep.TOP, mode=Mode.PRIVATE)
    add(chamfer4_piece_31)
    with BuildSketch(Plane(origin=(46, 5.45, 2), x_dir=(0.999813220622208, 0, -0.019326765612700657), z_dir=(0, -1, 0))) as chamfer4_piece_32_section:
        Polygon((CHAMFER4_SIZE_2 * 0.999813220551, CHAMFER4_SIZE_2 * 0.0193267656113), (-CHAMFER4_SIZE * 0.0193267656127, CHAMFER4_SIZE * 0.999813220622), (0, 0), align=None)
    chamfer4_piece_32 = extrude(amount=2.9, mode=Mode.PRIVATE)
    chamfer4_piece_32 = split(chamfer4_piece_32, bisect_by=Plane(origin=(48, 4, 2.390065827), z_dir=(-1, 0, 0)), keep=Keep.TOP, mode=Mode.PRIVATE)
    add(chamfer4_piece_32)

    # Chamfer5: one chamfer whose edges measure the first distance from different faces: ONE call of the kernel's chamfer builder (chamfer() names one face for all edges)
    chamfer5_edges_1 = [part.edges().sort_by_distance(p)[0] for p in [
        (3.6, 4, 0),
        (3.6, 4, 54),
    ]]
    chamfer5_side_1 = [part.faces().sort_by_distance(p)[0] for p in [
        (3.6, 4, 27),
    ]]
    chamfer5_edges_2 = [part.edges().sort_by_distance(p)[0] for p in [
        (24, 1.75, 0),
        (24, 1.75, 54),
    ]]
    chamfer5_side_2 = [part.faces().sort_by_distance(p)[0] for p in [
        (24, 1.75, 27),
    ]]
    chamfer5_edges_3 = [part.edges().sort_by_distance(p)[0] for p in [
        (44.4, 4, 0),
        (44.4, 4, 54),
    ]]
    chamfer5_side_3 = [part.faces().sort_by_distance(p)[0] for p in [
        (44.4, 4, 27),
    ]]
    chamfer5_edges_4 = [part.edges().sort_by_distance(p)[0] for p in [
        (24, 6.25, 0),
        (24, 6.25, 54),
    ]]
    chamfer5_side_4 = [part.faces().sort_by_distance(p)[0] for p in [
        (24, 6.25, 27),
    ]]
    chamfer5 = BRepFilletAPI_MakeChamfer(part.part.solid().wrapped)
    for e in chamfer5_edges_1:
        chamfer5.Add(CHAMFER5_SIZE, CHAMFER5_SIZE2, e.wrapped, chamfer5_side_1[0].wrapped)  # the first distance lies on this face
    for e in chamfer5_edges_2:
        chamfer5.Add(CHAMFER5_SIZE, CHAMFER5_SIZE2, e.wrapped, chamfer5_side_2[0].wrapped)  # the first distance lies on this face
    for e in chamfer5_edges_3:
        chamfer5.Add(CHAMFER5_SIZE, CHAMFER5_SIZE2, e.wrapped, chamfer5_side_3[0].wrapped)  # the first distance lies on this face
    for e in chamfer5_edges_4:
        chamfer5.Add(CHAMFER5_SIZE, CHAMFER5_SIZE2, e.wrapped, chamfer5_side_4[0].wrapped)  # the first distance lies on this face
    add(Compound.cast(chamfer5.Shape()), mode=Mode.REPLACE)


solid = part.part
